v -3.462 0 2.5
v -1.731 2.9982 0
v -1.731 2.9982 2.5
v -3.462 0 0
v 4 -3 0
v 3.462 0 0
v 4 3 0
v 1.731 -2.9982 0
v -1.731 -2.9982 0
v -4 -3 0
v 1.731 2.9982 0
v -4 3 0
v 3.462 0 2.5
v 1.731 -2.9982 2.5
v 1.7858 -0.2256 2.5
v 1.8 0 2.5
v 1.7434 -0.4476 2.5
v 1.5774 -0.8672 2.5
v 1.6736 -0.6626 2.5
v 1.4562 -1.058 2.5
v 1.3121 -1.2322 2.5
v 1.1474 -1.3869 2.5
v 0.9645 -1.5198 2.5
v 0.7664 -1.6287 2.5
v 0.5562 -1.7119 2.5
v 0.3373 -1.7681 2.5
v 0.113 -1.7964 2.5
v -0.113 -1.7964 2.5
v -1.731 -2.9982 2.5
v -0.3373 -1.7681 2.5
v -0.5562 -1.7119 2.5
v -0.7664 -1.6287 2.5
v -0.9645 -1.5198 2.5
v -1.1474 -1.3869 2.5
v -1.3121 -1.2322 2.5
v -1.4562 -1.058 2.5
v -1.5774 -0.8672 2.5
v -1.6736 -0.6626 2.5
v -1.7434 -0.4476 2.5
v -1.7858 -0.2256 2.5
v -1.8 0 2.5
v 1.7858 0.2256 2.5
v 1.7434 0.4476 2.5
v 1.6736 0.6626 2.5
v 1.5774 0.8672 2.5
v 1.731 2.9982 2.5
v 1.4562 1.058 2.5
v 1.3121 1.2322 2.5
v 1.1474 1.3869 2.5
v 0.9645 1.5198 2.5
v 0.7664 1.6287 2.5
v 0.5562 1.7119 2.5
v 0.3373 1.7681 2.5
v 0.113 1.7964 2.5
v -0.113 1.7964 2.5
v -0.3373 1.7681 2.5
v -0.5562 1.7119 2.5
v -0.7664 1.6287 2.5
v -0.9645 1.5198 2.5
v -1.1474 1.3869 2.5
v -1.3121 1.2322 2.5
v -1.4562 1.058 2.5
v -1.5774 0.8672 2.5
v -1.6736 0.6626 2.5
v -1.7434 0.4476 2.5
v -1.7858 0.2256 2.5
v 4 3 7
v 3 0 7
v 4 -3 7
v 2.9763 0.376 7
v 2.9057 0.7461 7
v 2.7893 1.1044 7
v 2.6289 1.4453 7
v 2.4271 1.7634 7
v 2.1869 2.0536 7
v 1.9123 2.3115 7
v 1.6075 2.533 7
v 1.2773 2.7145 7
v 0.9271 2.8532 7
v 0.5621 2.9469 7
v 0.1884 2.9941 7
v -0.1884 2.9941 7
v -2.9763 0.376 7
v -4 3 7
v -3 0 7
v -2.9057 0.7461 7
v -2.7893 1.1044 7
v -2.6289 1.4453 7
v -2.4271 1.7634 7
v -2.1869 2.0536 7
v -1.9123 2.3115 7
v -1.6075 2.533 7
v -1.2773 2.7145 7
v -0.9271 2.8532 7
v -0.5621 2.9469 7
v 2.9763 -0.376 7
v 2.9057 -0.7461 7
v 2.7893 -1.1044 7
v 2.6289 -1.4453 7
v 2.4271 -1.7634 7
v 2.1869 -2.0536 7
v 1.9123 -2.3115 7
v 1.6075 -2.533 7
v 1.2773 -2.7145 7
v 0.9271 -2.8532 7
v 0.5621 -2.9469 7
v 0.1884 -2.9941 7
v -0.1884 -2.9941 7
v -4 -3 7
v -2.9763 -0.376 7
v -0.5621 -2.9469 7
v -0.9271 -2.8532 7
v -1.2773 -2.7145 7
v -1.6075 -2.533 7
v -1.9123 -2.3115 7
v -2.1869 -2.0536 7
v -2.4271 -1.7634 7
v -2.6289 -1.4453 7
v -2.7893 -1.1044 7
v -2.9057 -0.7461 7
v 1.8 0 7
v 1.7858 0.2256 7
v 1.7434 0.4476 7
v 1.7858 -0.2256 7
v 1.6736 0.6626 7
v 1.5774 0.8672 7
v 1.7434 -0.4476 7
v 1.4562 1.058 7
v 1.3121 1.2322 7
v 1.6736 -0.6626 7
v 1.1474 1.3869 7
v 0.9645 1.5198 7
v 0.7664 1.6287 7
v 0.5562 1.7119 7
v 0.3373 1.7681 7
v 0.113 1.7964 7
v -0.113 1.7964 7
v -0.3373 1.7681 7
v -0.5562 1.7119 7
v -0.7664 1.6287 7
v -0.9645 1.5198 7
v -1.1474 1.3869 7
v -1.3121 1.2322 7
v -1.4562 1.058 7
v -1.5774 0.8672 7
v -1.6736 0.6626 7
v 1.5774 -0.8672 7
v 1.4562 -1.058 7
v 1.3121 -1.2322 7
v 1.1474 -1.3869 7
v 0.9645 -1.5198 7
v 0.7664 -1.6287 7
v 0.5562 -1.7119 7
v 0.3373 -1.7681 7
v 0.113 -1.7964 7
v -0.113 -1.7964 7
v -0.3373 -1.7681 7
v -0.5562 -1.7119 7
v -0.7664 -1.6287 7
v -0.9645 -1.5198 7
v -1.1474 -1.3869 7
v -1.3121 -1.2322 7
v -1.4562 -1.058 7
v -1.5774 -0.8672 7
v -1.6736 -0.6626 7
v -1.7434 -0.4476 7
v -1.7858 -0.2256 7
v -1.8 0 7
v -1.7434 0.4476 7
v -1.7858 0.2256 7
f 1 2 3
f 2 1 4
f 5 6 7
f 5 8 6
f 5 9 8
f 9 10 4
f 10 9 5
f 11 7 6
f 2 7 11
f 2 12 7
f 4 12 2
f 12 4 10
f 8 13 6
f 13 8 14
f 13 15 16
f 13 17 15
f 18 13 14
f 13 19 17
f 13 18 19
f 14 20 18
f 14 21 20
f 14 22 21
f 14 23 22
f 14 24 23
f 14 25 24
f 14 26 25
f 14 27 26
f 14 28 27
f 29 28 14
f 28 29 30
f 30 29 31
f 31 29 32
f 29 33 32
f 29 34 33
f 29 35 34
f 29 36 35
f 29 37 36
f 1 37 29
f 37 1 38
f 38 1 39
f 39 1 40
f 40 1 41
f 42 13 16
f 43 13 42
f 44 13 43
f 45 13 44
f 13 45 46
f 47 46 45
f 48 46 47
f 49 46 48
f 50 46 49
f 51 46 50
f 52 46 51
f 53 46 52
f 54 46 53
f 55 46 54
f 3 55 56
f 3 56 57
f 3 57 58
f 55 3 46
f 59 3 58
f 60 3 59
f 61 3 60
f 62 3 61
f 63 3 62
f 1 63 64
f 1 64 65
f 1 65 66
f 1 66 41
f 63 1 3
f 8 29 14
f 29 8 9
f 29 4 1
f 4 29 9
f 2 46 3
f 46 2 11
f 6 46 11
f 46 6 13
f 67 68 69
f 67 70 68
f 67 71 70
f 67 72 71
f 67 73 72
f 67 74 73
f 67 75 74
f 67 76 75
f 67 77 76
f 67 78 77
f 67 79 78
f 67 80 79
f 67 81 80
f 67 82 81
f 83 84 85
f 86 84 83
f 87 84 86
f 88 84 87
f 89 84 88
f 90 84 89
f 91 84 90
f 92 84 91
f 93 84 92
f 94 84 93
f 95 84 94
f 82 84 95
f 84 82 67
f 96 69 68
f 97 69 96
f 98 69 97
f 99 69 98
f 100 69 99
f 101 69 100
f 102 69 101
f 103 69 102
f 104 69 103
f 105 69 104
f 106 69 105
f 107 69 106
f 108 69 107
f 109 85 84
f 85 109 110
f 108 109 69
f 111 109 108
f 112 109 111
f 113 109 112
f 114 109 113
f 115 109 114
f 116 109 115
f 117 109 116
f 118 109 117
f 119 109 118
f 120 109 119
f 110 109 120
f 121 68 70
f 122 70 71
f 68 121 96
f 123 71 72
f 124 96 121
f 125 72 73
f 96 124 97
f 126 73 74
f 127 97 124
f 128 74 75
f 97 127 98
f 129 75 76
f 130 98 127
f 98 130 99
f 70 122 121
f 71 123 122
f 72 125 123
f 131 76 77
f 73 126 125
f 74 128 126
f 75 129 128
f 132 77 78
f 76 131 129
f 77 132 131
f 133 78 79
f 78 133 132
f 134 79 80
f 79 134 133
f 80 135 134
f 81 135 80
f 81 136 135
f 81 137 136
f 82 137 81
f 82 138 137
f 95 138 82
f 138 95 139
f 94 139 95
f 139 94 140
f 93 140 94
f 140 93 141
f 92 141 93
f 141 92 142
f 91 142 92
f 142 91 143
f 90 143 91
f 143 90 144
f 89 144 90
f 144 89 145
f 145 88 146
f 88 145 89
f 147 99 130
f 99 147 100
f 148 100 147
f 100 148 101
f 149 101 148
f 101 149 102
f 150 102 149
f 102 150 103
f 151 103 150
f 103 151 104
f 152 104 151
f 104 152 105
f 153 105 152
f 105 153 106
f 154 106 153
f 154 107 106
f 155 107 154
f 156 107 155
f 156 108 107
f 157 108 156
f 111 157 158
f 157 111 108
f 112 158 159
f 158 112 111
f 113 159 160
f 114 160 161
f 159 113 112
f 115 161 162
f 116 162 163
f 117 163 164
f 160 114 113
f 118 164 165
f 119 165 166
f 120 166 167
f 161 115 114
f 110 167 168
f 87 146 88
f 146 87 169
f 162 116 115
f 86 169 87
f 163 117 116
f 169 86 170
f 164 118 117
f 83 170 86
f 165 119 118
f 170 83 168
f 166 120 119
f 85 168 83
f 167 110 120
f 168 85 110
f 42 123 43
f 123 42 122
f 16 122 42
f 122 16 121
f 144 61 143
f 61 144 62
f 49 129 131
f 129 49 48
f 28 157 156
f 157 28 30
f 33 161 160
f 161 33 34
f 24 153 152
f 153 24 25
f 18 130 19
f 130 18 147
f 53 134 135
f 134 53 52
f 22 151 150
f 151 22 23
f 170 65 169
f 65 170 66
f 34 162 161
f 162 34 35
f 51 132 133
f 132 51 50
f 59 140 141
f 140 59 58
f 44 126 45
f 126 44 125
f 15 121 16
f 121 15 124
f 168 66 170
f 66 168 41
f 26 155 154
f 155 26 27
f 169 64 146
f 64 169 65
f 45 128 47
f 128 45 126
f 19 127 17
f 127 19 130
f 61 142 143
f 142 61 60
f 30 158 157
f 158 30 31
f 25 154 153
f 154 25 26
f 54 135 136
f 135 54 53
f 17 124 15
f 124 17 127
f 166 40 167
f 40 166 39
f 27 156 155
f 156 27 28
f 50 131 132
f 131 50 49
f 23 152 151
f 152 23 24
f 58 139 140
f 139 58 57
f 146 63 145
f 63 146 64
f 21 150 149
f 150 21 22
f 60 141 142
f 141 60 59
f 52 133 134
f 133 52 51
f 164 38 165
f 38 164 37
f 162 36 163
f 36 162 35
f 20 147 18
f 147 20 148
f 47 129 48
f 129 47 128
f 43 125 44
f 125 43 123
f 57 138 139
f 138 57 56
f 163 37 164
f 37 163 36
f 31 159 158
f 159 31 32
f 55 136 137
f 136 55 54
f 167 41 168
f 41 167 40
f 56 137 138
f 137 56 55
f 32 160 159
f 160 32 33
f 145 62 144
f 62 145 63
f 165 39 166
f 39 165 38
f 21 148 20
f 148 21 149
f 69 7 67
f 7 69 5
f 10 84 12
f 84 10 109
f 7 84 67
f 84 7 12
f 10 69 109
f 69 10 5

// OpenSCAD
$fn = 50;


difference() {
	union() {
		translate(v = [-4.0000000000, -3.0000000000, 0]) {
			cube(size = [8, 6, 7]);
		}
	}
	union() {
		translate(v = [0, 0, 0]) {
			rotate(a = [0, 0, 0]) {
				difference() {
					union() {
						#linear_extrude(height = 2.5000000000) {
							polygon(points = [[3.4620000000, 0.0000000000], [1.7310000000, 2.9981799479], [-1.7310000000, 2.9981799479], [-3.4620000000, 0.0000000000], [-1.7310000000, -2.9981799479], [1.7310000000, -2.9981799479]]);
						}
					}
					union();
				}
			}
		}
		translate(v = [0, 0, 7]) {
			rotate(a = [0, 0, 0]) {
				difference() {
					union() {
						#translate(v = [0, 0, -25.0000000000]) {
							cylinder(h = 25, r = 1.5000000000);
						}
						#cylinder(h = 253.2000000000, r = 3.0000000000);
						#translate(v = [0, 0, -25.0000000000]) {
							cylinder(h = 25, r = 1.8000000000);
						}
						#translate(v = [0, 0, -25.0000000000]) {
							cylinder(h = 25, r = 1.5000000000);
						}
					}
					union();
				}
			}
		}
	}
}
